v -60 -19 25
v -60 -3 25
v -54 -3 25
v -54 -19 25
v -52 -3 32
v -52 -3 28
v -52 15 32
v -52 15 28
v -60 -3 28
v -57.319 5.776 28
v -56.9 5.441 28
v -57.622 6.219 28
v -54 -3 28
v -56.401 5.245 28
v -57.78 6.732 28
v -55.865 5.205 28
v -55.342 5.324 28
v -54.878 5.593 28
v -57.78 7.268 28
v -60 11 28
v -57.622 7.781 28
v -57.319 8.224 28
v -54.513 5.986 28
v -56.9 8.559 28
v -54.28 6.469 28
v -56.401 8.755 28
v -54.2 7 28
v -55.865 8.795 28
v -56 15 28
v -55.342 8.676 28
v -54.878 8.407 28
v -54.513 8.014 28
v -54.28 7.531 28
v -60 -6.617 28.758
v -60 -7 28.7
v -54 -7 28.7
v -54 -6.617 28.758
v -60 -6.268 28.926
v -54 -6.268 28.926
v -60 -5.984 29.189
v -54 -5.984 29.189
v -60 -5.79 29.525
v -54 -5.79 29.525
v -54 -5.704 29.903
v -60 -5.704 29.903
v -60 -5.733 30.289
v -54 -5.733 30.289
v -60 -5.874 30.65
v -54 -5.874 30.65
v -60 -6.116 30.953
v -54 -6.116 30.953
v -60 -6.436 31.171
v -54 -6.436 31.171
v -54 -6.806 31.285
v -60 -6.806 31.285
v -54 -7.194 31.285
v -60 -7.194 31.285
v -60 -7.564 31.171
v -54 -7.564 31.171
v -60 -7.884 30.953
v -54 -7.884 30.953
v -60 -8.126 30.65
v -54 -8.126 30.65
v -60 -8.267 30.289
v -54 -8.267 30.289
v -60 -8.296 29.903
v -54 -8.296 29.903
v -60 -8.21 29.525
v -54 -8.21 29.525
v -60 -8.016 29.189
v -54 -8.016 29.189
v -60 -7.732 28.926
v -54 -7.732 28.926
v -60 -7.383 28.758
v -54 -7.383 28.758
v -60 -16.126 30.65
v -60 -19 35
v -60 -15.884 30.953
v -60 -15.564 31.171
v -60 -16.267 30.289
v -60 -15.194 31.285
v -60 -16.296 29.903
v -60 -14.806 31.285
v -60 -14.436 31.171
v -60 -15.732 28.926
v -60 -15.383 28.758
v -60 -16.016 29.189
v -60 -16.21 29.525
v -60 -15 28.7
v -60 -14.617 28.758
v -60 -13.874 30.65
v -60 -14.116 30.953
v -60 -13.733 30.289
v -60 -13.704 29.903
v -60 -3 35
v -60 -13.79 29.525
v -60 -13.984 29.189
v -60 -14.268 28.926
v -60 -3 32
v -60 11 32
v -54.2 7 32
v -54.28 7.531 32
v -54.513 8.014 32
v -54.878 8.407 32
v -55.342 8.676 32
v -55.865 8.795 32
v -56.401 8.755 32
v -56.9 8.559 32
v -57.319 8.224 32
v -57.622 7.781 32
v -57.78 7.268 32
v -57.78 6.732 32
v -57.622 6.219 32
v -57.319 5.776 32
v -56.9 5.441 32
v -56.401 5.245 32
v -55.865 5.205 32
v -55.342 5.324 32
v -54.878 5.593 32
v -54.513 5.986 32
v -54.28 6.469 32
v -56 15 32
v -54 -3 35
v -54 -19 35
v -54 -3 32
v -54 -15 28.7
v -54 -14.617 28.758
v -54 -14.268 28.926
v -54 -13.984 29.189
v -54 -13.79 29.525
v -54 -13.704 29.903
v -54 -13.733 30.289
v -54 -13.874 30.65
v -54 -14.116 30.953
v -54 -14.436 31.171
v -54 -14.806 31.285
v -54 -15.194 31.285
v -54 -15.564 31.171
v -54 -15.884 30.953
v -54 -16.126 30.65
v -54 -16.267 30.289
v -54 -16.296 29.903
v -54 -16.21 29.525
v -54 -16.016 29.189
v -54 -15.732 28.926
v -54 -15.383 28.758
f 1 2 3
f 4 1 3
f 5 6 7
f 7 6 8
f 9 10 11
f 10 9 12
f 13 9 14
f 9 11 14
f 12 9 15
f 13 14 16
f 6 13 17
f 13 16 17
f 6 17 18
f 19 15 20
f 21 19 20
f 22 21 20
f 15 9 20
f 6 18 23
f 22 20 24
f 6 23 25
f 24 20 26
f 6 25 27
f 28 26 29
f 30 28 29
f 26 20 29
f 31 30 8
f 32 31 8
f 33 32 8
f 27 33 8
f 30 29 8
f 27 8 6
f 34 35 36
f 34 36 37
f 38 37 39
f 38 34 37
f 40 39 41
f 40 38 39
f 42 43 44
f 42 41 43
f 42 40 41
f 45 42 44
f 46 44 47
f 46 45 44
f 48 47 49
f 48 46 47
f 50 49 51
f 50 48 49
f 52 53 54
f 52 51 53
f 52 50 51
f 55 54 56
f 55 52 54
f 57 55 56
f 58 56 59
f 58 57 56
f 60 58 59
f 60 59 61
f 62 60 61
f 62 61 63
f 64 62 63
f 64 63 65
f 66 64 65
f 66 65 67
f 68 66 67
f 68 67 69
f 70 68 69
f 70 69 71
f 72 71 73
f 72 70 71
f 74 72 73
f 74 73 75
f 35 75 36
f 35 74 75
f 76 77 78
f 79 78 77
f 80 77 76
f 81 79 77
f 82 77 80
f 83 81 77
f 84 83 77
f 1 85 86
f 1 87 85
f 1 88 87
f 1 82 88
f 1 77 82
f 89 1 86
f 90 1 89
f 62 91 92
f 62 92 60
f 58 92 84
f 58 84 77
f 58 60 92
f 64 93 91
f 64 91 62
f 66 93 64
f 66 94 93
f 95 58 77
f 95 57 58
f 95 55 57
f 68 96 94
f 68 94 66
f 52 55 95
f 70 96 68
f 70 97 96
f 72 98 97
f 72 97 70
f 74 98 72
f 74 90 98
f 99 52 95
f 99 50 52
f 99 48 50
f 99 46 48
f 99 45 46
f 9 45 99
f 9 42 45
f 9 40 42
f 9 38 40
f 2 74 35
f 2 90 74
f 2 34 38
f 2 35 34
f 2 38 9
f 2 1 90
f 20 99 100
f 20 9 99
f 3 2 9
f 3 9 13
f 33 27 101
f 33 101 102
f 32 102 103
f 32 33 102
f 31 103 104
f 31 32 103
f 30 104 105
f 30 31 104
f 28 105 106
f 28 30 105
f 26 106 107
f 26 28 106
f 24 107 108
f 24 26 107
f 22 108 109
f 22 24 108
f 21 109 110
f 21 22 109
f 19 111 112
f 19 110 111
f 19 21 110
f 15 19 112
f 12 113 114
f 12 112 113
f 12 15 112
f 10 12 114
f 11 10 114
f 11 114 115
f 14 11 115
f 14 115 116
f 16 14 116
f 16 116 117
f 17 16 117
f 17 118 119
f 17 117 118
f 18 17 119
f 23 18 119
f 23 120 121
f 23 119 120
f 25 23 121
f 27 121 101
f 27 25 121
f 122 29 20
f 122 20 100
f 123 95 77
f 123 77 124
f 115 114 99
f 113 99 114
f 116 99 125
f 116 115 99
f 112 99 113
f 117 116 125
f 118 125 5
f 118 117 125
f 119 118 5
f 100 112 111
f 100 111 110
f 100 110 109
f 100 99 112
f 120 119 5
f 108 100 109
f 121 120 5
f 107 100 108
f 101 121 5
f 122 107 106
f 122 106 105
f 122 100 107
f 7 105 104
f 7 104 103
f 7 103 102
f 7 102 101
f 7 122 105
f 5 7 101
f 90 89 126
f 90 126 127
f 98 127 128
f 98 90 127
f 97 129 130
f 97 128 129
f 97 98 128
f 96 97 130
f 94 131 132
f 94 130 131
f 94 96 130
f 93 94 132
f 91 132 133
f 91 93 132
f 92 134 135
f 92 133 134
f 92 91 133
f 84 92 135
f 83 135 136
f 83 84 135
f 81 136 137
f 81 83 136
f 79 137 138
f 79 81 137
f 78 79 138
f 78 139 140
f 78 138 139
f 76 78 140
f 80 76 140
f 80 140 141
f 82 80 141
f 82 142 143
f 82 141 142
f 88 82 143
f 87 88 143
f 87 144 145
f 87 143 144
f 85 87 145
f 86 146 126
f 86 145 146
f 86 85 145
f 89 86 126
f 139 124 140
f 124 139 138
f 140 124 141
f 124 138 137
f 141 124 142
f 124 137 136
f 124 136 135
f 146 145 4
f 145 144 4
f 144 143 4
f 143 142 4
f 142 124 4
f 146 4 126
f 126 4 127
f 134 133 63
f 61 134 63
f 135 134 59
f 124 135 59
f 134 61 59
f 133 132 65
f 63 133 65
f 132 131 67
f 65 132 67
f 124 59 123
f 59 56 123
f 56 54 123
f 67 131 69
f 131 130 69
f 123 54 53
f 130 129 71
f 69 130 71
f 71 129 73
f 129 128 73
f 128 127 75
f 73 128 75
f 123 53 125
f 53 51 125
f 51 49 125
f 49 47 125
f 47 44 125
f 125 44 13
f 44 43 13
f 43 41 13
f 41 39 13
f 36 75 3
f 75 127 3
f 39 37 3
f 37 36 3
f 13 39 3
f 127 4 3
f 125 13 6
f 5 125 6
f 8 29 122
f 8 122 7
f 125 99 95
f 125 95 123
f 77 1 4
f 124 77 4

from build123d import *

# Parameters (mm, degrees)
CYLINDER087_R           = 1.3
CYLINDER087_DEPTH       = 40
CYLINDER087_PITCH_ANGLE = 90
CYLINDER086_R           = 1.3
CYLINDER086_DEPTH       = 40
CYLINDER086_PITCH_ANGLE = 90
CYLINDER085_R           = 1.3
CYLINDER085_DEPTH       = 40
CYLINDER085_PITCH_ANGLE = 90
CYLINDER067_R           = 1.8
CYLINDER067_DEPTH       = 40
BOX034_W                = 4
BOX034_H                = 16
BOX034_DEPTH            = 10
BOX031_W                = 8
BOX031_H                = 34
BOX031_DEPTH            = 4
BOX033_W                = 6
BOX033_H                = 16
BOX033_DEPTH            = 10
CHAMFER008_SIZE         = 4


with BuildPart() as cylinder365:
    # Cylinder087 → Cylinder087 (new body)
    with BuildSketch(Plane.XY):
        Circle(CYLINDER087_R)
    extrude(amount=CYLINDER087_DEPTH)


with BuildPart() as cylinder365_1:
    # Cylinder087 pitch: moved
    add(cylinder365.part.rotate(Axis((0, 0, 0), (0, 1, 0)), CYLINDER087_PITCH_ANGLE))


with BuildPart() as cylinder365_2:
    # Cylinder087 placement: moved
    add(cylinder365_1.part.moved(Location((-48, 7, 30))))


with BuildPart() as cylinder364:
    # Cylinder086 → Cylinder086 (new body)
    with BuildSketch(Plane.XY):
        Circle(CYLINDER086_R)
    extrude(amount=CYLINDER086_DEPTH)


with BuildPart() as cylinder364_1:
    # Cylinder086 pitch: moved
    add(cylinder364.part.rotate(Axis((0, 0, 0), (0, 1, 0)), CYLINDER086_PITCH_ANGLE))


with BuildPart() as cylinder364_2:
    # Cylinder086 placement: moved
    add(cylinder364_1.part.moved(Location((-67, -15, 30))))


with BuildPart() as hinge_screw_holes_b003:
    # Cylinder085 → Cylinder085 (new body)
    with BuildSketch(Plane.XY):
        Circle(CYLINDER085_R)
    extrude(amount=CYLINDER085_DEPTH)


with BuildPart() as hinge_screw_holes_b003_1:
    # Cylinder085 pitch: moved
    add(hinge_screw_holes_b003.part.rotate(Axis((0, 0, 0), (0, 1, 0)), CYLINDER085_PITCH_ANGLE))


with BuildPart() as hinge_screw_holes_b003_2:
    # Cylinder085 placement: moved
    add(hinge_screw_holes_b003_1.part.moved(Location((-92, -7, 30))))

    # Fusion057: union Cylinder364
    add(cylinder364_2.part)

    # Fusion058: union Cylinder365
    add(cylinder365_2.part)


with BuildPart() as cylinder345:
    # Cylinder067 → Cylinder067 (new body)
    with BuildSketch(Plane(origin=(-56, 7, 15), x_dir=(1, 0, 0), z_dir=(0, 0, 1))):
        Circle(CYLINDER067_R)
    extrude(amount=CYLINDER067_DEPTH)


with BuildPart() as cube022:
    # Box034 → Box034 (new body)
    with BuildSketch(Plane(origin=(-54, -19, 25), x_dir=(1, 0, 0), z_dir=(0, 0, 1))):
        with Locations((2, 8)):
            Rectangle(BOX034_W, BOX034_H)
    extrude(amount=BOX034_DEPTH)


with BuildPart() as cut038:
    # Box031 → Box031 (new body)
    with BuildSketch(Plane(origin=(-60, -19, 28), x_dir=(1, 0, 0), z_dir=(0, 0, 1))):
        with Locations((4, 17)):
            Rectangle(BOX031_W, BOX031_H)
    extrude(amount=BOX031_DEPTH)

    # Cut038: cut Cube022
    add(cube022.part, mode=Mode.SUBTRACT)


with BuildPart() as switch_rocker_f:
    # Box033 → Box033 (new body)
    with BuildSketch(Plane(origin=(-60, -19, 25), x_dir=(1, 0, 0), z_dir=(0, 0, 1))):
        with Locations((3, 8)):
            Rectangle(BOX033_W, BOX033_H)
    extrude(amount=BOX033_DEPTH)

    # Fusion044: union Cut038
    add(cut038.part)

    # Cut039: cut Cylinder345
    add(cylinder345.part, mode=Mode.SUBTRACT)

    # Cut047: cut hinge-screw-holes-b003
    add(hinge_screw_holes_b003_2.part, mode=Mode.SUBTRACT)

    # Chamfer008
    chamfer008_edges = [switch_rocker_f.edges().sort_by_distance(p)[0] for p in [
        (-60, 15, 30),
    ]]
    chamfer(chamfer008_edges, length=CHAMFER008_SIZE)


solid = switch_rocker_f.part
